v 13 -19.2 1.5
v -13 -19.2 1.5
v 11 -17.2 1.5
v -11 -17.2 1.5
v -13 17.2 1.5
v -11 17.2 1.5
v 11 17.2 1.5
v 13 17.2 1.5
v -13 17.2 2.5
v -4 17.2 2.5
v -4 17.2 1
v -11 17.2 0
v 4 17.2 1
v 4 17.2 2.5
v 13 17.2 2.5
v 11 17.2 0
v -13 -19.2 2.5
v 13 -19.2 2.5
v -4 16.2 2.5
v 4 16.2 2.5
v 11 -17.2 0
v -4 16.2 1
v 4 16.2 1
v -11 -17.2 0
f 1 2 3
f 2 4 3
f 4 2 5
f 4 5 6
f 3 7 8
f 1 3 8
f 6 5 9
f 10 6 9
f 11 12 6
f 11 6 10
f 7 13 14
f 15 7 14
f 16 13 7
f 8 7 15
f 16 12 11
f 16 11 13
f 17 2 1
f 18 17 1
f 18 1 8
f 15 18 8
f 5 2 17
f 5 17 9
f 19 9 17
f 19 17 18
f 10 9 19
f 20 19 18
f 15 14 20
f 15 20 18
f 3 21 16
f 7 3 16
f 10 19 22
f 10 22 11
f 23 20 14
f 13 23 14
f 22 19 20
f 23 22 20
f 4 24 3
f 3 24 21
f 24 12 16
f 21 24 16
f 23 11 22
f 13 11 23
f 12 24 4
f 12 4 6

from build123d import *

# Parameters (mm, degrees)
SKETCH_W     = 22
SKETCH_H     = 34.4
PAD_DEPTH    = 1.5
SKETCH001_W  = 26
SKETCH001_H  = 36.4
PAD001_DEPTH = 1
SKETCH002_W  = 8
SKETCH002_H  = 1
POCKET_DEPTH = 1.5


with BuildPart() as part:
    # Sketch → Pad (new body)
    with BuildSketch(Plane.XY):
        Rectangle(SKETCH_W, SKETCH_H)
    extrude(amount=PAD_DEPTH)

    # Sketch001 (on Face6 of Pad) → Pad001 (join)
    with BuildSketch(Plane.XY.offset(1.5)):
        with Locations((0, -1)):
            Rectangle(SKETCH001_W, SKETCH001_H)
    extrude(amount=PAD001_DEPTH)

    # Sketch002 (on Face11 of Pad001) → Pocket (cut)
    with BuildSketch(Plane.XY.offset(2.5)):
        with Locations((0, 16.7)):
            Rectangle(SKETCH002_W, SKETCH002_H)
    extrude(amount=-POCKET_DEPTH, mode=Mode.SUBTRACT)


solid = part.part
